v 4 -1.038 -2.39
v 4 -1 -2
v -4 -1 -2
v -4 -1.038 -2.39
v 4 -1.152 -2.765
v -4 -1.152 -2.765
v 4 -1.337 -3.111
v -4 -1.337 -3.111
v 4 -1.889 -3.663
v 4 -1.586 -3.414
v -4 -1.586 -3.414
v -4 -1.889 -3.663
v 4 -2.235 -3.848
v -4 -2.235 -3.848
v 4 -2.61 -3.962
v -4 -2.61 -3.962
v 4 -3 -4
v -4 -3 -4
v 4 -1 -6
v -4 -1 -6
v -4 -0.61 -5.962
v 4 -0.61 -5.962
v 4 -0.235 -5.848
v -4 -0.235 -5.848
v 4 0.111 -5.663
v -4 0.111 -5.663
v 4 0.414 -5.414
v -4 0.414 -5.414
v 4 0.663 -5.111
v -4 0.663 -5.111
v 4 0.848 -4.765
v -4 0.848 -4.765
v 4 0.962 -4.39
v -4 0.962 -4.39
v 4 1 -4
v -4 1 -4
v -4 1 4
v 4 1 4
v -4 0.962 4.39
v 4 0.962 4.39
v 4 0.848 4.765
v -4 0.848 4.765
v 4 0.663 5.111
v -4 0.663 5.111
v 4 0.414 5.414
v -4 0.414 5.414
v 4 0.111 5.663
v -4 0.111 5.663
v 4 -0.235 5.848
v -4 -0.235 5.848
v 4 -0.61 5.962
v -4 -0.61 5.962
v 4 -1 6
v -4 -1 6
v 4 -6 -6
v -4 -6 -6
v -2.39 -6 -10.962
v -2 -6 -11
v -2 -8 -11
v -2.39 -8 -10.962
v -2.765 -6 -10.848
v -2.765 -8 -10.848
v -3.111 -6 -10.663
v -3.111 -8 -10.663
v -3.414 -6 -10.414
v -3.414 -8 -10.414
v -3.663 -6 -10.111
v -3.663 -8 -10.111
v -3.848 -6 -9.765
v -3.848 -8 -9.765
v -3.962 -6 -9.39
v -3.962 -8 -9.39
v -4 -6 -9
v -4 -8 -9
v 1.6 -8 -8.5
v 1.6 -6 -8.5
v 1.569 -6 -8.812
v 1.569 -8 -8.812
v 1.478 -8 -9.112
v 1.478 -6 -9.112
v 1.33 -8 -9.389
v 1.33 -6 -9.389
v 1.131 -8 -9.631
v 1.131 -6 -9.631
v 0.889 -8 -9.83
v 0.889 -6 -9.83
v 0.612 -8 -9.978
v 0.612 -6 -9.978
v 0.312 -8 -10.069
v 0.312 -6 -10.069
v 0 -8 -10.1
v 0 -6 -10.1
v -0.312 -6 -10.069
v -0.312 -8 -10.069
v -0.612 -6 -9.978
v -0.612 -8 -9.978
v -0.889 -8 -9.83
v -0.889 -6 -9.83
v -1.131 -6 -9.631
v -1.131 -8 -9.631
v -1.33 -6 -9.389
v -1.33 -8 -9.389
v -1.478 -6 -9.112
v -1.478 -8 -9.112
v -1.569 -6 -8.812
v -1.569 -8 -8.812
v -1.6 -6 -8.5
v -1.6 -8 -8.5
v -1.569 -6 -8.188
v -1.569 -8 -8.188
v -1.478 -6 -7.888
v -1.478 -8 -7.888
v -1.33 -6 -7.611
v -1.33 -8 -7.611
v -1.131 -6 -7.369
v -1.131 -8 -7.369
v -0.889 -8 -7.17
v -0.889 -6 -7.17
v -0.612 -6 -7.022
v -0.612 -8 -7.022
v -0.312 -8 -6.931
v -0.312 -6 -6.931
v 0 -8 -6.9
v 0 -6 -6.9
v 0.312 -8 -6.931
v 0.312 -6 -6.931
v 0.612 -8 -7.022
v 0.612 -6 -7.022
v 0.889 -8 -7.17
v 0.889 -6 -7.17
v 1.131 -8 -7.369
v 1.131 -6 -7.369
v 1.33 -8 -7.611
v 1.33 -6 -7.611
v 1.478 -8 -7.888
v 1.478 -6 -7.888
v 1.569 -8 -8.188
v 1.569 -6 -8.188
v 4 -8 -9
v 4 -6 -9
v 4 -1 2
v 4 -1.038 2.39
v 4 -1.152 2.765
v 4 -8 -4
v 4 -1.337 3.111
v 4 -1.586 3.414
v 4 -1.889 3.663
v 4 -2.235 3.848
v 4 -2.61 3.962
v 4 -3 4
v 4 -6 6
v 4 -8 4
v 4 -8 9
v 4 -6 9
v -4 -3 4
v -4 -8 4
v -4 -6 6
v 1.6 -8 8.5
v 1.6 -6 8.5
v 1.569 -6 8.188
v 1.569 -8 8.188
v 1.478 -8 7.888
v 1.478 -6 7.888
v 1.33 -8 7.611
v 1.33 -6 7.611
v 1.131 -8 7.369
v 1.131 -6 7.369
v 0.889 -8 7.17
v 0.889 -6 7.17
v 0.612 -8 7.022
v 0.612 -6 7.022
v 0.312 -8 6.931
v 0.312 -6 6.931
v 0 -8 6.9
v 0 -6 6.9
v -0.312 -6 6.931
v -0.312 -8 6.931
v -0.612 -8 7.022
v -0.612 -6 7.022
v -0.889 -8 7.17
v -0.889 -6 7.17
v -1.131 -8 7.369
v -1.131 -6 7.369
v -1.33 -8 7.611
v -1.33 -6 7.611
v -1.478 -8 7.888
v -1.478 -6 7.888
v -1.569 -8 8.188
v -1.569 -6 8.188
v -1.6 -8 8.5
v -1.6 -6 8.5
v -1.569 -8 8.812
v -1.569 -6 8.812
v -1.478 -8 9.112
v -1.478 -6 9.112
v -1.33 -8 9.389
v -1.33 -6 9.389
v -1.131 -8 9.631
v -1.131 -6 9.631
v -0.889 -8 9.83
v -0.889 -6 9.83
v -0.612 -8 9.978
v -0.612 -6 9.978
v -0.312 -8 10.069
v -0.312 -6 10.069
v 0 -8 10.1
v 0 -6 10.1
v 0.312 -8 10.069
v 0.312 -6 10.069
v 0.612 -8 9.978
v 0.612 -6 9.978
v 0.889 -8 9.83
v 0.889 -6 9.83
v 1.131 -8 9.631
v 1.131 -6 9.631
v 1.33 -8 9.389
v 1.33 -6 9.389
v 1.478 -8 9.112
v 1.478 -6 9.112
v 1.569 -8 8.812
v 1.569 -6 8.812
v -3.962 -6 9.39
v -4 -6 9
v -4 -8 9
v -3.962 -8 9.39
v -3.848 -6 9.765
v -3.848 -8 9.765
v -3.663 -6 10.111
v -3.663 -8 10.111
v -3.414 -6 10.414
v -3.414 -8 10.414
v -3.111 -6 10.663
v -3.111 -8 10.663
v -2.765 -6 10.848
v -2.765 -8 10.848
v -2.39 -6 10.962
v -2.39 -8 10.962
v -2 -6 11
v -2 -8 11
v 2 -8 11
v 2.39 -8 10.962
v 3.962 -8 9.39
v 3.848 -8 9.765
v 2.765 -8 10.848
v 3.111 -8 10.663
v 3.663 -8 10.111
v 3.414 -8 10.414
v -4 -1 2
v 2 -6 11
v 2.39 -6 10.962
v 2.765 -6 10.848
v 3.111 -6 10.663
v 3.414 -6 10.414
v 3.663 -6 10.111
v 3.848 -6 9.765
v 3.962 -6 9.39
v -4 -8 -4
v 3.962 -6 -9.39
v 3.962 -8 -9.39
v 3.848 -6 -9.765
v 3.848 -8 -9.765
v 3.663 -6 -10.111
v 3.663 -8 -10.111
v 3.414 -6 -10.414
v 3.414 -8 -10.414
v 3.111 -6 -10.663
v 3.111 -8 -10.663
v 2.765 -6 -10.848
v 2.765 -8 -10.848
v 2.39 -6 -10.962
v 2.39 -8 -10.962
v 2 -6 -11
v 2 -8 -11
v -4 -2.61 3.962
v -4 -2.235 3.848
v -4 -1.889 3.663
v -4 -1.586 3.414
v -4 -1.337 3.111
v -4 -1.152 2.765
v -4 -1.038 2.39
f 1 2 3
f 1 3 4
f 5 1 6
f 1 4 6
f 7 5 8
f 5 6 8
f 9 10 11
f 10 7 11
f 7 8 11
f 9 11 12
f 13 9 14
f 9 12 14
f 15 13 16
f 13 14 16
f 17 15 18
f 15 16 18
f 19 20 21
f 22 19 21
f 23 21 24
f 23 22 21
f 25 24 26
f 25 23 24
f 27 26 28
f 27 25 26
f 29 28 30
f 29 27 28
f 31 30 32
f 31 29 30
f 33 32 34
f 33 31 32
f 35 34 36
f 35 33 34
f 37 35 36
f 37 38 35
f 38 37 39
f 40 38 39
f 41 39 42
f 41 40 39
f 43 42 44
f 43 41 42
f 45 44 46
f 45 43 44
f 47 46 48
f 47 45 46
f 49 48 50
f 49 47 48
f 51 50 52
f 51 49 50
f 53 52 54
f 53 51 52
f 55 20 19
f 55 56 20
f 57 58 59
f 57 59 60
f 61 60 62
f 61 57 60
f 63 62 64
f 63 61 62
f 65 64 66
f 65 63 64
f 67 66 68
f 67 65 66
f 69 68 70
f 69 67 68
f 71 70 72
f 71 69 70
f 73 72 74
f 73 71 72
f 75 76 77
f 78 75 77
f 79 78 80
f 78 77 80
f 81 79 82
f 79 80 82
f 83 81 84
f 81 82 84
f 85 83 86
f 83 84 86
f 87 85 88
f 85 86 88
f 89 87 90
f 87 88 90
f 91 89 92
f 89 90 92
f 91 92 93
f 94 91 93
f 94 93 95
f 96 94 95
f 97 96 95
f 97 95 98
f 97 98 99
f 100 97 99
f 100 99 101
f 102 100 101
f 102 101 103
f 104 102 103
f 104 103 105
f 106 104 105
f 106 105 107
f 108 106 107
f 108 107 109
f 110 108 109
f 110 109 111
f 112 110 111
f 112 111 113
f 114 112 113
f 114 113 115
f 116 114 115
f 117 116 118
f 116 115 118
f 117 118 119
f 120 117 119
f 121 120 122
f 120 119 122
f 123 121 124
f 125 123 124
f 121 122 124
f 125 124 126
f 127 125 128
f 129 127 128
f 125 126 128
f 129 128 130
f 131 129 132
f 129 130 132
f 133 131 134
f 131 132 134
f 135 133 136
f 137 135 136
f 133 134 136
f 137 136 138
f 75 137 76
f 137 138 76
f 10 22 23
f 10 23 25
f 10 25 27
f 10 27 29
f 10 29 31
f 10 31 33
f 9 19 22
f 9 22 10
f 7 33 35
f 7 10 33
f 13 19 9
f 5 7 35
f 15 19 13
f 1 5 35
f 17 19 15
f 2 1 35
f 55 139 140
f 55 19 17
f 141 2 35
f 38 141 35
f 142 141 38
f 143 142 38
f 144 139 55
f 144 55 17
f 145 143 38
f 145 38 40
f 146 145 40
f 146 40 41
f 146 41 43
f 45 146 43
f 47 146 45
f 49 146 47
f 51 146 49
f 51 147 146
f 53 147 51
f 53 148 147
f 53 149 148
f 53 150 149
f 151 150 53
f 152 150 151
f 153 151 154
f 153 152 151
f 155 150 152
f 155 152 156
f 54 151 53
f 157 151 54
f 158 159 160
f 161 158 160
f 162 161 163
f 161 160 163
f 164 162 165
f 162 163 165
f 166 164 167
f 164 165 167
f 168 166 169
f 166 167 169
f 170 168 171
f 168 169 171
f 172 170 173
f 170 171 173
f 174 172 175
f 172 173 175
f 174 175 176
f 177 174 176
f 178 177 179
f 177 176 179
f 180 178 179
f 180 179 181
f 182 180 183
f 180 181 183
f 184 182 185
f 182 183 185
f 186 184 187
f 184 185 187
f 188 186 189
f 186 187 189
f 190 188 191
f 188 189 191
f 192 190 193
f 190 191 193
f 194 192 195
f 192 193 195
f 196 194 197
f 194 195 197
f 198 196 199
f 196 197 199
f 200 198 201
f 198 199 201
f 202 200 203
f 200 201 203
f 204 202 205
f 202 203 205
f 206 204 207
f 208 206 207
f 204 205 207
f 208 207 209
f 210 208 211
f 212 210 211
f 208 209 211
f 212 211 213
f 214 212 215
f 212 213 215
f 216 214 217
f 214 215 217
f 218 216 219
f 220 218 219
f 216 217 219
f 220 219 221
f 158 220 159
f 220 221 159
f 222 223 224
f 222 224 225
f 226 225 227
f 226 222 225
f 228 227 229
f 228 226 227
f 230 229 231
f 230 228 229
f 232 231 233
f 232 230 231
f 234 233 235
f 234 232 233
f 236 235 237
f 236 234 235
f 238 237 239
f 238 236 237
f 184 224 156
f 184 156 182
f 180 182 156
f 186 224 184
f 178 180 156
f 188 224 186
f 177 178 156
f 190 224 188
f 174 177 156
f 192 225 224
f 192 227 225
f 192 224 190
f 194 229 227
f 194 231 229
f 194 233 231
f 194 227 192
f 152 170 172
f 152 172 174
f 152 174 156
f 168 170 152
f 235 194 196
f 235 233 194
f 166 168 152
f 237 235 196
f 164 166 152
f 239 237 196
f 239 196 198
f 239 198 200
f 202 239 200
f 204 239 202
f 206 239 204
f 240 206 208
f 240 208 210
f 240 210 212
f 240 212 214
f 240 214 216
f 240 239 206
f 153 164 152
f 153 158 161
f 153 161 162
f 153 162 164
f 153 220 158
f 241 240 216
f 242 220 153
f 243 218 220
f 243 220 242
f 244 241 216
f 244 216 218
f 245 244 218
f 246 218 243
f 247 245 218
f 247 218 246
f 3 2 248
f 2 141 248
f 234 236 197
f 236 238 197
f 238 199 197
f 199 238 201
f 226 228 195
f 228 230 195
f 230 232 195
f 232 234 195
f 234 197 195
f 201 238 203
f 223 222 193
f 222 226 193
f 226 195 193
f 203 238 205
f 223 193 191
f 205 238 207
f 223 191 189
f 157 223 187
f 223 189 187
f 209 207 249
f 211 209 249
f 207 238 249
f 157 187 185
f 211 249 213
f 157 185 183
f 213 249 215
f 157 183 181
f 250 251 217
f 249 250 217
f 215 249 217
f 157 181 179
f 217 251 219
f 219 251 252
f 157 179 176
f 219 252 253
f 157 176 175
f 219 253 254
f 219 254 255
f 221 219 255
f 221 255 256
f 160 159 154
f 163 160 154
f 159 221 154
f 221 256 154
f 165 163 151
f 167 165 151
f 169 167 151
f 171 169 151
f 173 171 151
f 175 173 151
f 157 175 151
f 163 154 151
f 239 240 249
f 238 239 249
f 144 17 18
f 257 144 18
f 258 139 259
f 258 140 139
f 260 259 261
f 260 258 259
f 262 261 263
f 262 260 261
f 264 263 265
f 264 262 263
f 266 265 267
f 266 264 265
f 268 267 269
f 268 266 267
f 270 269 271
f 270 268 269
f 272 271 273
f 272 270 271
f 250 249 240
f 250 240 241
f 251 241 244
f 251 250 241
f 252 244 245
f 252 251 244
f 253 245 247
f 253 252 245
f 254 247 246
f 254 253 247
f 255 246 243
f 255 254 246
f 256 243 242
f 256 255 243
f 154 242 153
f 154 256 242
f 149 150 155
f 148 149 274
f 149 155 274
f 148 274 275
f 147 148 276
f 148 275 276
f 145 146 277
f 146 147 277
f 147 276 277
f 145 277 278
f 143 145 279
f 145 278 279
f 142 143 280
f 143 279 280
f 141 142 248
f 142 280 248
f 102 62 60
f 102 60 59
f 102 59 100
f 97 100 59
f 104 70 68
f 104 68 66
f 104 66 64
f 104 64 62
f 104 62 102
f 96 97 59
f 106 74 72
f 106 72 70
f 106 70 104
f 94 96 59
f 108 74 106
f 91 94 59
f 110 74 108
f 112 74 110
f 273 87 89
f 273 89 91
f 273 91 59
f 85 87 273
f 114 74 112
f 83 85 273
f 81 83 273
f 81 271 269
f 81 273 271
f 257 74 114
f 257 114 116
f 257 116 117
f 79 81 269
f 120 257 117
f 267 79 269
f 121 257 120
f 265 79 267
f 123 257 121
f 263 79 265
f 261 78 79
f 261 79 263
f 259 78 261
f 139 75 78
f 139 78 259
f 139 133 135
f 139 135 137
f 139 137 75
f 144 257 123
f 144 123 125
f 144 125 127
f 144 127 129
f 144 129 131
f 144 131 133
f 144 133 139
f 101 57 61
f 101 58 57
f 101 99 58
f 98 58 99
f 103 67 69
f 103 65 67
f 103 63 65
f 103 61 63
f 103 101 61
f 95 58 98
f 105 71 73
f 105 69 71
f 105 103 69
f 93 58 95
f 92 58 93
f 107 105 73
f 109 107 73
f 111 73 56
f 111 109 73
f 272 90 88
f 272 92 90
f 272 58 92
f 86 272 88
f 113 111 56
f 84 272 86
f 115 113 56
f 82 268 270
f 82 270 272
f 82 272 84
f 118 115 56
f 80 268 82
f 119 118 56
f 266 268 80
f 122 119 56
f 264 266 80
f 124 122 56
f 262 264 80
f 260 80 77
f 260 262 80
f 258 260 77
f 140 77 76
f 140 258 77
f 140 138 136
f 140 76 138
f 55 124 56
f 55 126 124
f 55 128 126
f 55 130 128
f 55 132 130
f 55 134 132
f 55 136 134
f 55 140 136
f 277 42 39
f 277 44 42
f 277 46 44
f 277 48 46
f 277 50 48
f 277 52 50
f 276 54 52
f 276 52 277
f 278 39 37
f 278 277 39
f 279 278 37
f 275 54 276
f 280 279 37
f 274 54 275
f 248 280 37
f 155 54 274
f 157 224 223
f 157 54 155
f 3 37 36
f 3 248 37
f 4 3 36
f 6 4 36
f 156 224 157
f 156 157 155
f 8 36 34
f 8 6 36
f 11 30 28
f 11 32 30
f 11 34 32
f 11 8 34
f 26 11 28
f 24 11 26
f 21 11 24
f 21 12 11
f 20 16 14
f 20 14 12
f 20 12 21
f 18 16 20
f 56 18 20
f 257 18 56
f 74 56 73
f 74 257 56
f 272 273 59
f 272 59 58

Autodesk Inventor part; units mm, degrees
ref_plane "YZ Plane" through (0, 0, 0) normal (1, 0, 0) x (0, 1, 0)
ref_plane "XZ Plane" through (0, 0, 0) normal (0, 1, 0) x (-1, 0, 0)
ref_plane "XY Plane" through (0, 0, 0) normal (0, 0, 1) x (1, 0, 0)
sketch "Skizze1" plane through (0, 0, 0) normal (0, 1, 0) x (-1, 0, 0)
  line L0 (4, -6) -> (-4, -6)
  line L1 (-4, -6) -> (-4, 6)
  line L2 (-4, 6) -> (4, 6)
  line L3 (4, 6) -> (4, -6)
  line L4 (0, -8.4) -> (0, 8.4) projected
  line L5 (-5.6, 0) -> (5.6, 0) projected
  point P0 (0, 0)
  dimension "d0" = 8
  dimension "d1" = 12
extrude "Extrusion1" add sketch "Skizze1" along normal mid plane 2
sketch "Skizze2" plane through (0, -1, 0) normal (0, -1, 0) x (1, 0, 0)
  line L0 (-4, -6) -> (-4, 6) projected
  line L1 (4, 6) -> (4, -6) projected
  line L2 (-4, -6) -> (4, -6)
  line L3 (4, -6) -> (4, -4)
  line L4 (4, -4) -> (-4, -4)
  line L5 (-4, -4) -> (-4, -6)
  line L6 (-4, 6) -> (4, 6)
  line L7 (4, 6) -> (4, 4)
  line L8 (4, 4) -> (-4, 4)
  line L9 (-4, 4) -> (-4, 6)
  point P0 (0, 0)
  dimension "d4" = 2
  dimension "d5" = 2
extrude "Extrusion2" add sketch "Skizze2" along normal blind 7 contours L0 L4 L1 L2 | L0 L6 L1 L8
sketch "Skizze3" plane through (4, 1, 6) normal (1, 0, 0) x (0, 0, -1)
  line L0 (2, -9) -> (0, -9) projected
  line L1 (0, -9) -> (-5, -9)
  line L2 (-5, -9) -> (-5, -7)
  line L3 (-5, -7) -> (0, -7)
  line L4 (0, -7) -> (0, -9)
  line L5 (12, -9) -> (10, -9) projected
  line L6 (12, -9) -> (17, -9)
  line L7 (17, -9) -> (17, -7)
  line L8 (17, -7) -> (12, -7)
  line L9 (12, -7) -> (12, -9)
  point P0 (6, -1)
  dimension "d8" = 5
  dimension "d9" = 2
  dimension "d10" = 5
  dimension "d11" = 2
extrude "Extrusion3" add sketch "Skizze3" against normal blind 8
sketch "Skizze4" plane through (4, -6, 11) normal (0, 1, 0) x (1, 0, 0)
  circle A0 centre (-4, 2.5) radius 1.6
  line L0 (0, 5) -> (0, 0) projected
  line L1 (0, 0) -> (-8, 0) projected
  circle A1 centre (-4, 19.5) radius 1.6
  line L2 (0, 22) -> (0, 17) projected
  line L3 (0, 22) -> (-8, 22) projected
  point P0 (-4, 11)
  dimension "d14" = 3.2
  dimension "d15" = 4
  dimension "d16" = 2.5
  dimension "d17" = 3.2
  dimension "d18" = 4
  dimension "d19" = 2.5
extrude "Extrusion4" cut sketch "Skizze4" against normal up to surface (2 mm away)
fillet "Rundung1" radius 2 8 edges at (0, 1, 6) (0, 1, -6) (0, -1, 4) (0, -1, -4) (-4, -7, 11) (4, -7, 11) (4, -7, -11) (-4, -7, -11)
properties part number "Kabelhalterung"
